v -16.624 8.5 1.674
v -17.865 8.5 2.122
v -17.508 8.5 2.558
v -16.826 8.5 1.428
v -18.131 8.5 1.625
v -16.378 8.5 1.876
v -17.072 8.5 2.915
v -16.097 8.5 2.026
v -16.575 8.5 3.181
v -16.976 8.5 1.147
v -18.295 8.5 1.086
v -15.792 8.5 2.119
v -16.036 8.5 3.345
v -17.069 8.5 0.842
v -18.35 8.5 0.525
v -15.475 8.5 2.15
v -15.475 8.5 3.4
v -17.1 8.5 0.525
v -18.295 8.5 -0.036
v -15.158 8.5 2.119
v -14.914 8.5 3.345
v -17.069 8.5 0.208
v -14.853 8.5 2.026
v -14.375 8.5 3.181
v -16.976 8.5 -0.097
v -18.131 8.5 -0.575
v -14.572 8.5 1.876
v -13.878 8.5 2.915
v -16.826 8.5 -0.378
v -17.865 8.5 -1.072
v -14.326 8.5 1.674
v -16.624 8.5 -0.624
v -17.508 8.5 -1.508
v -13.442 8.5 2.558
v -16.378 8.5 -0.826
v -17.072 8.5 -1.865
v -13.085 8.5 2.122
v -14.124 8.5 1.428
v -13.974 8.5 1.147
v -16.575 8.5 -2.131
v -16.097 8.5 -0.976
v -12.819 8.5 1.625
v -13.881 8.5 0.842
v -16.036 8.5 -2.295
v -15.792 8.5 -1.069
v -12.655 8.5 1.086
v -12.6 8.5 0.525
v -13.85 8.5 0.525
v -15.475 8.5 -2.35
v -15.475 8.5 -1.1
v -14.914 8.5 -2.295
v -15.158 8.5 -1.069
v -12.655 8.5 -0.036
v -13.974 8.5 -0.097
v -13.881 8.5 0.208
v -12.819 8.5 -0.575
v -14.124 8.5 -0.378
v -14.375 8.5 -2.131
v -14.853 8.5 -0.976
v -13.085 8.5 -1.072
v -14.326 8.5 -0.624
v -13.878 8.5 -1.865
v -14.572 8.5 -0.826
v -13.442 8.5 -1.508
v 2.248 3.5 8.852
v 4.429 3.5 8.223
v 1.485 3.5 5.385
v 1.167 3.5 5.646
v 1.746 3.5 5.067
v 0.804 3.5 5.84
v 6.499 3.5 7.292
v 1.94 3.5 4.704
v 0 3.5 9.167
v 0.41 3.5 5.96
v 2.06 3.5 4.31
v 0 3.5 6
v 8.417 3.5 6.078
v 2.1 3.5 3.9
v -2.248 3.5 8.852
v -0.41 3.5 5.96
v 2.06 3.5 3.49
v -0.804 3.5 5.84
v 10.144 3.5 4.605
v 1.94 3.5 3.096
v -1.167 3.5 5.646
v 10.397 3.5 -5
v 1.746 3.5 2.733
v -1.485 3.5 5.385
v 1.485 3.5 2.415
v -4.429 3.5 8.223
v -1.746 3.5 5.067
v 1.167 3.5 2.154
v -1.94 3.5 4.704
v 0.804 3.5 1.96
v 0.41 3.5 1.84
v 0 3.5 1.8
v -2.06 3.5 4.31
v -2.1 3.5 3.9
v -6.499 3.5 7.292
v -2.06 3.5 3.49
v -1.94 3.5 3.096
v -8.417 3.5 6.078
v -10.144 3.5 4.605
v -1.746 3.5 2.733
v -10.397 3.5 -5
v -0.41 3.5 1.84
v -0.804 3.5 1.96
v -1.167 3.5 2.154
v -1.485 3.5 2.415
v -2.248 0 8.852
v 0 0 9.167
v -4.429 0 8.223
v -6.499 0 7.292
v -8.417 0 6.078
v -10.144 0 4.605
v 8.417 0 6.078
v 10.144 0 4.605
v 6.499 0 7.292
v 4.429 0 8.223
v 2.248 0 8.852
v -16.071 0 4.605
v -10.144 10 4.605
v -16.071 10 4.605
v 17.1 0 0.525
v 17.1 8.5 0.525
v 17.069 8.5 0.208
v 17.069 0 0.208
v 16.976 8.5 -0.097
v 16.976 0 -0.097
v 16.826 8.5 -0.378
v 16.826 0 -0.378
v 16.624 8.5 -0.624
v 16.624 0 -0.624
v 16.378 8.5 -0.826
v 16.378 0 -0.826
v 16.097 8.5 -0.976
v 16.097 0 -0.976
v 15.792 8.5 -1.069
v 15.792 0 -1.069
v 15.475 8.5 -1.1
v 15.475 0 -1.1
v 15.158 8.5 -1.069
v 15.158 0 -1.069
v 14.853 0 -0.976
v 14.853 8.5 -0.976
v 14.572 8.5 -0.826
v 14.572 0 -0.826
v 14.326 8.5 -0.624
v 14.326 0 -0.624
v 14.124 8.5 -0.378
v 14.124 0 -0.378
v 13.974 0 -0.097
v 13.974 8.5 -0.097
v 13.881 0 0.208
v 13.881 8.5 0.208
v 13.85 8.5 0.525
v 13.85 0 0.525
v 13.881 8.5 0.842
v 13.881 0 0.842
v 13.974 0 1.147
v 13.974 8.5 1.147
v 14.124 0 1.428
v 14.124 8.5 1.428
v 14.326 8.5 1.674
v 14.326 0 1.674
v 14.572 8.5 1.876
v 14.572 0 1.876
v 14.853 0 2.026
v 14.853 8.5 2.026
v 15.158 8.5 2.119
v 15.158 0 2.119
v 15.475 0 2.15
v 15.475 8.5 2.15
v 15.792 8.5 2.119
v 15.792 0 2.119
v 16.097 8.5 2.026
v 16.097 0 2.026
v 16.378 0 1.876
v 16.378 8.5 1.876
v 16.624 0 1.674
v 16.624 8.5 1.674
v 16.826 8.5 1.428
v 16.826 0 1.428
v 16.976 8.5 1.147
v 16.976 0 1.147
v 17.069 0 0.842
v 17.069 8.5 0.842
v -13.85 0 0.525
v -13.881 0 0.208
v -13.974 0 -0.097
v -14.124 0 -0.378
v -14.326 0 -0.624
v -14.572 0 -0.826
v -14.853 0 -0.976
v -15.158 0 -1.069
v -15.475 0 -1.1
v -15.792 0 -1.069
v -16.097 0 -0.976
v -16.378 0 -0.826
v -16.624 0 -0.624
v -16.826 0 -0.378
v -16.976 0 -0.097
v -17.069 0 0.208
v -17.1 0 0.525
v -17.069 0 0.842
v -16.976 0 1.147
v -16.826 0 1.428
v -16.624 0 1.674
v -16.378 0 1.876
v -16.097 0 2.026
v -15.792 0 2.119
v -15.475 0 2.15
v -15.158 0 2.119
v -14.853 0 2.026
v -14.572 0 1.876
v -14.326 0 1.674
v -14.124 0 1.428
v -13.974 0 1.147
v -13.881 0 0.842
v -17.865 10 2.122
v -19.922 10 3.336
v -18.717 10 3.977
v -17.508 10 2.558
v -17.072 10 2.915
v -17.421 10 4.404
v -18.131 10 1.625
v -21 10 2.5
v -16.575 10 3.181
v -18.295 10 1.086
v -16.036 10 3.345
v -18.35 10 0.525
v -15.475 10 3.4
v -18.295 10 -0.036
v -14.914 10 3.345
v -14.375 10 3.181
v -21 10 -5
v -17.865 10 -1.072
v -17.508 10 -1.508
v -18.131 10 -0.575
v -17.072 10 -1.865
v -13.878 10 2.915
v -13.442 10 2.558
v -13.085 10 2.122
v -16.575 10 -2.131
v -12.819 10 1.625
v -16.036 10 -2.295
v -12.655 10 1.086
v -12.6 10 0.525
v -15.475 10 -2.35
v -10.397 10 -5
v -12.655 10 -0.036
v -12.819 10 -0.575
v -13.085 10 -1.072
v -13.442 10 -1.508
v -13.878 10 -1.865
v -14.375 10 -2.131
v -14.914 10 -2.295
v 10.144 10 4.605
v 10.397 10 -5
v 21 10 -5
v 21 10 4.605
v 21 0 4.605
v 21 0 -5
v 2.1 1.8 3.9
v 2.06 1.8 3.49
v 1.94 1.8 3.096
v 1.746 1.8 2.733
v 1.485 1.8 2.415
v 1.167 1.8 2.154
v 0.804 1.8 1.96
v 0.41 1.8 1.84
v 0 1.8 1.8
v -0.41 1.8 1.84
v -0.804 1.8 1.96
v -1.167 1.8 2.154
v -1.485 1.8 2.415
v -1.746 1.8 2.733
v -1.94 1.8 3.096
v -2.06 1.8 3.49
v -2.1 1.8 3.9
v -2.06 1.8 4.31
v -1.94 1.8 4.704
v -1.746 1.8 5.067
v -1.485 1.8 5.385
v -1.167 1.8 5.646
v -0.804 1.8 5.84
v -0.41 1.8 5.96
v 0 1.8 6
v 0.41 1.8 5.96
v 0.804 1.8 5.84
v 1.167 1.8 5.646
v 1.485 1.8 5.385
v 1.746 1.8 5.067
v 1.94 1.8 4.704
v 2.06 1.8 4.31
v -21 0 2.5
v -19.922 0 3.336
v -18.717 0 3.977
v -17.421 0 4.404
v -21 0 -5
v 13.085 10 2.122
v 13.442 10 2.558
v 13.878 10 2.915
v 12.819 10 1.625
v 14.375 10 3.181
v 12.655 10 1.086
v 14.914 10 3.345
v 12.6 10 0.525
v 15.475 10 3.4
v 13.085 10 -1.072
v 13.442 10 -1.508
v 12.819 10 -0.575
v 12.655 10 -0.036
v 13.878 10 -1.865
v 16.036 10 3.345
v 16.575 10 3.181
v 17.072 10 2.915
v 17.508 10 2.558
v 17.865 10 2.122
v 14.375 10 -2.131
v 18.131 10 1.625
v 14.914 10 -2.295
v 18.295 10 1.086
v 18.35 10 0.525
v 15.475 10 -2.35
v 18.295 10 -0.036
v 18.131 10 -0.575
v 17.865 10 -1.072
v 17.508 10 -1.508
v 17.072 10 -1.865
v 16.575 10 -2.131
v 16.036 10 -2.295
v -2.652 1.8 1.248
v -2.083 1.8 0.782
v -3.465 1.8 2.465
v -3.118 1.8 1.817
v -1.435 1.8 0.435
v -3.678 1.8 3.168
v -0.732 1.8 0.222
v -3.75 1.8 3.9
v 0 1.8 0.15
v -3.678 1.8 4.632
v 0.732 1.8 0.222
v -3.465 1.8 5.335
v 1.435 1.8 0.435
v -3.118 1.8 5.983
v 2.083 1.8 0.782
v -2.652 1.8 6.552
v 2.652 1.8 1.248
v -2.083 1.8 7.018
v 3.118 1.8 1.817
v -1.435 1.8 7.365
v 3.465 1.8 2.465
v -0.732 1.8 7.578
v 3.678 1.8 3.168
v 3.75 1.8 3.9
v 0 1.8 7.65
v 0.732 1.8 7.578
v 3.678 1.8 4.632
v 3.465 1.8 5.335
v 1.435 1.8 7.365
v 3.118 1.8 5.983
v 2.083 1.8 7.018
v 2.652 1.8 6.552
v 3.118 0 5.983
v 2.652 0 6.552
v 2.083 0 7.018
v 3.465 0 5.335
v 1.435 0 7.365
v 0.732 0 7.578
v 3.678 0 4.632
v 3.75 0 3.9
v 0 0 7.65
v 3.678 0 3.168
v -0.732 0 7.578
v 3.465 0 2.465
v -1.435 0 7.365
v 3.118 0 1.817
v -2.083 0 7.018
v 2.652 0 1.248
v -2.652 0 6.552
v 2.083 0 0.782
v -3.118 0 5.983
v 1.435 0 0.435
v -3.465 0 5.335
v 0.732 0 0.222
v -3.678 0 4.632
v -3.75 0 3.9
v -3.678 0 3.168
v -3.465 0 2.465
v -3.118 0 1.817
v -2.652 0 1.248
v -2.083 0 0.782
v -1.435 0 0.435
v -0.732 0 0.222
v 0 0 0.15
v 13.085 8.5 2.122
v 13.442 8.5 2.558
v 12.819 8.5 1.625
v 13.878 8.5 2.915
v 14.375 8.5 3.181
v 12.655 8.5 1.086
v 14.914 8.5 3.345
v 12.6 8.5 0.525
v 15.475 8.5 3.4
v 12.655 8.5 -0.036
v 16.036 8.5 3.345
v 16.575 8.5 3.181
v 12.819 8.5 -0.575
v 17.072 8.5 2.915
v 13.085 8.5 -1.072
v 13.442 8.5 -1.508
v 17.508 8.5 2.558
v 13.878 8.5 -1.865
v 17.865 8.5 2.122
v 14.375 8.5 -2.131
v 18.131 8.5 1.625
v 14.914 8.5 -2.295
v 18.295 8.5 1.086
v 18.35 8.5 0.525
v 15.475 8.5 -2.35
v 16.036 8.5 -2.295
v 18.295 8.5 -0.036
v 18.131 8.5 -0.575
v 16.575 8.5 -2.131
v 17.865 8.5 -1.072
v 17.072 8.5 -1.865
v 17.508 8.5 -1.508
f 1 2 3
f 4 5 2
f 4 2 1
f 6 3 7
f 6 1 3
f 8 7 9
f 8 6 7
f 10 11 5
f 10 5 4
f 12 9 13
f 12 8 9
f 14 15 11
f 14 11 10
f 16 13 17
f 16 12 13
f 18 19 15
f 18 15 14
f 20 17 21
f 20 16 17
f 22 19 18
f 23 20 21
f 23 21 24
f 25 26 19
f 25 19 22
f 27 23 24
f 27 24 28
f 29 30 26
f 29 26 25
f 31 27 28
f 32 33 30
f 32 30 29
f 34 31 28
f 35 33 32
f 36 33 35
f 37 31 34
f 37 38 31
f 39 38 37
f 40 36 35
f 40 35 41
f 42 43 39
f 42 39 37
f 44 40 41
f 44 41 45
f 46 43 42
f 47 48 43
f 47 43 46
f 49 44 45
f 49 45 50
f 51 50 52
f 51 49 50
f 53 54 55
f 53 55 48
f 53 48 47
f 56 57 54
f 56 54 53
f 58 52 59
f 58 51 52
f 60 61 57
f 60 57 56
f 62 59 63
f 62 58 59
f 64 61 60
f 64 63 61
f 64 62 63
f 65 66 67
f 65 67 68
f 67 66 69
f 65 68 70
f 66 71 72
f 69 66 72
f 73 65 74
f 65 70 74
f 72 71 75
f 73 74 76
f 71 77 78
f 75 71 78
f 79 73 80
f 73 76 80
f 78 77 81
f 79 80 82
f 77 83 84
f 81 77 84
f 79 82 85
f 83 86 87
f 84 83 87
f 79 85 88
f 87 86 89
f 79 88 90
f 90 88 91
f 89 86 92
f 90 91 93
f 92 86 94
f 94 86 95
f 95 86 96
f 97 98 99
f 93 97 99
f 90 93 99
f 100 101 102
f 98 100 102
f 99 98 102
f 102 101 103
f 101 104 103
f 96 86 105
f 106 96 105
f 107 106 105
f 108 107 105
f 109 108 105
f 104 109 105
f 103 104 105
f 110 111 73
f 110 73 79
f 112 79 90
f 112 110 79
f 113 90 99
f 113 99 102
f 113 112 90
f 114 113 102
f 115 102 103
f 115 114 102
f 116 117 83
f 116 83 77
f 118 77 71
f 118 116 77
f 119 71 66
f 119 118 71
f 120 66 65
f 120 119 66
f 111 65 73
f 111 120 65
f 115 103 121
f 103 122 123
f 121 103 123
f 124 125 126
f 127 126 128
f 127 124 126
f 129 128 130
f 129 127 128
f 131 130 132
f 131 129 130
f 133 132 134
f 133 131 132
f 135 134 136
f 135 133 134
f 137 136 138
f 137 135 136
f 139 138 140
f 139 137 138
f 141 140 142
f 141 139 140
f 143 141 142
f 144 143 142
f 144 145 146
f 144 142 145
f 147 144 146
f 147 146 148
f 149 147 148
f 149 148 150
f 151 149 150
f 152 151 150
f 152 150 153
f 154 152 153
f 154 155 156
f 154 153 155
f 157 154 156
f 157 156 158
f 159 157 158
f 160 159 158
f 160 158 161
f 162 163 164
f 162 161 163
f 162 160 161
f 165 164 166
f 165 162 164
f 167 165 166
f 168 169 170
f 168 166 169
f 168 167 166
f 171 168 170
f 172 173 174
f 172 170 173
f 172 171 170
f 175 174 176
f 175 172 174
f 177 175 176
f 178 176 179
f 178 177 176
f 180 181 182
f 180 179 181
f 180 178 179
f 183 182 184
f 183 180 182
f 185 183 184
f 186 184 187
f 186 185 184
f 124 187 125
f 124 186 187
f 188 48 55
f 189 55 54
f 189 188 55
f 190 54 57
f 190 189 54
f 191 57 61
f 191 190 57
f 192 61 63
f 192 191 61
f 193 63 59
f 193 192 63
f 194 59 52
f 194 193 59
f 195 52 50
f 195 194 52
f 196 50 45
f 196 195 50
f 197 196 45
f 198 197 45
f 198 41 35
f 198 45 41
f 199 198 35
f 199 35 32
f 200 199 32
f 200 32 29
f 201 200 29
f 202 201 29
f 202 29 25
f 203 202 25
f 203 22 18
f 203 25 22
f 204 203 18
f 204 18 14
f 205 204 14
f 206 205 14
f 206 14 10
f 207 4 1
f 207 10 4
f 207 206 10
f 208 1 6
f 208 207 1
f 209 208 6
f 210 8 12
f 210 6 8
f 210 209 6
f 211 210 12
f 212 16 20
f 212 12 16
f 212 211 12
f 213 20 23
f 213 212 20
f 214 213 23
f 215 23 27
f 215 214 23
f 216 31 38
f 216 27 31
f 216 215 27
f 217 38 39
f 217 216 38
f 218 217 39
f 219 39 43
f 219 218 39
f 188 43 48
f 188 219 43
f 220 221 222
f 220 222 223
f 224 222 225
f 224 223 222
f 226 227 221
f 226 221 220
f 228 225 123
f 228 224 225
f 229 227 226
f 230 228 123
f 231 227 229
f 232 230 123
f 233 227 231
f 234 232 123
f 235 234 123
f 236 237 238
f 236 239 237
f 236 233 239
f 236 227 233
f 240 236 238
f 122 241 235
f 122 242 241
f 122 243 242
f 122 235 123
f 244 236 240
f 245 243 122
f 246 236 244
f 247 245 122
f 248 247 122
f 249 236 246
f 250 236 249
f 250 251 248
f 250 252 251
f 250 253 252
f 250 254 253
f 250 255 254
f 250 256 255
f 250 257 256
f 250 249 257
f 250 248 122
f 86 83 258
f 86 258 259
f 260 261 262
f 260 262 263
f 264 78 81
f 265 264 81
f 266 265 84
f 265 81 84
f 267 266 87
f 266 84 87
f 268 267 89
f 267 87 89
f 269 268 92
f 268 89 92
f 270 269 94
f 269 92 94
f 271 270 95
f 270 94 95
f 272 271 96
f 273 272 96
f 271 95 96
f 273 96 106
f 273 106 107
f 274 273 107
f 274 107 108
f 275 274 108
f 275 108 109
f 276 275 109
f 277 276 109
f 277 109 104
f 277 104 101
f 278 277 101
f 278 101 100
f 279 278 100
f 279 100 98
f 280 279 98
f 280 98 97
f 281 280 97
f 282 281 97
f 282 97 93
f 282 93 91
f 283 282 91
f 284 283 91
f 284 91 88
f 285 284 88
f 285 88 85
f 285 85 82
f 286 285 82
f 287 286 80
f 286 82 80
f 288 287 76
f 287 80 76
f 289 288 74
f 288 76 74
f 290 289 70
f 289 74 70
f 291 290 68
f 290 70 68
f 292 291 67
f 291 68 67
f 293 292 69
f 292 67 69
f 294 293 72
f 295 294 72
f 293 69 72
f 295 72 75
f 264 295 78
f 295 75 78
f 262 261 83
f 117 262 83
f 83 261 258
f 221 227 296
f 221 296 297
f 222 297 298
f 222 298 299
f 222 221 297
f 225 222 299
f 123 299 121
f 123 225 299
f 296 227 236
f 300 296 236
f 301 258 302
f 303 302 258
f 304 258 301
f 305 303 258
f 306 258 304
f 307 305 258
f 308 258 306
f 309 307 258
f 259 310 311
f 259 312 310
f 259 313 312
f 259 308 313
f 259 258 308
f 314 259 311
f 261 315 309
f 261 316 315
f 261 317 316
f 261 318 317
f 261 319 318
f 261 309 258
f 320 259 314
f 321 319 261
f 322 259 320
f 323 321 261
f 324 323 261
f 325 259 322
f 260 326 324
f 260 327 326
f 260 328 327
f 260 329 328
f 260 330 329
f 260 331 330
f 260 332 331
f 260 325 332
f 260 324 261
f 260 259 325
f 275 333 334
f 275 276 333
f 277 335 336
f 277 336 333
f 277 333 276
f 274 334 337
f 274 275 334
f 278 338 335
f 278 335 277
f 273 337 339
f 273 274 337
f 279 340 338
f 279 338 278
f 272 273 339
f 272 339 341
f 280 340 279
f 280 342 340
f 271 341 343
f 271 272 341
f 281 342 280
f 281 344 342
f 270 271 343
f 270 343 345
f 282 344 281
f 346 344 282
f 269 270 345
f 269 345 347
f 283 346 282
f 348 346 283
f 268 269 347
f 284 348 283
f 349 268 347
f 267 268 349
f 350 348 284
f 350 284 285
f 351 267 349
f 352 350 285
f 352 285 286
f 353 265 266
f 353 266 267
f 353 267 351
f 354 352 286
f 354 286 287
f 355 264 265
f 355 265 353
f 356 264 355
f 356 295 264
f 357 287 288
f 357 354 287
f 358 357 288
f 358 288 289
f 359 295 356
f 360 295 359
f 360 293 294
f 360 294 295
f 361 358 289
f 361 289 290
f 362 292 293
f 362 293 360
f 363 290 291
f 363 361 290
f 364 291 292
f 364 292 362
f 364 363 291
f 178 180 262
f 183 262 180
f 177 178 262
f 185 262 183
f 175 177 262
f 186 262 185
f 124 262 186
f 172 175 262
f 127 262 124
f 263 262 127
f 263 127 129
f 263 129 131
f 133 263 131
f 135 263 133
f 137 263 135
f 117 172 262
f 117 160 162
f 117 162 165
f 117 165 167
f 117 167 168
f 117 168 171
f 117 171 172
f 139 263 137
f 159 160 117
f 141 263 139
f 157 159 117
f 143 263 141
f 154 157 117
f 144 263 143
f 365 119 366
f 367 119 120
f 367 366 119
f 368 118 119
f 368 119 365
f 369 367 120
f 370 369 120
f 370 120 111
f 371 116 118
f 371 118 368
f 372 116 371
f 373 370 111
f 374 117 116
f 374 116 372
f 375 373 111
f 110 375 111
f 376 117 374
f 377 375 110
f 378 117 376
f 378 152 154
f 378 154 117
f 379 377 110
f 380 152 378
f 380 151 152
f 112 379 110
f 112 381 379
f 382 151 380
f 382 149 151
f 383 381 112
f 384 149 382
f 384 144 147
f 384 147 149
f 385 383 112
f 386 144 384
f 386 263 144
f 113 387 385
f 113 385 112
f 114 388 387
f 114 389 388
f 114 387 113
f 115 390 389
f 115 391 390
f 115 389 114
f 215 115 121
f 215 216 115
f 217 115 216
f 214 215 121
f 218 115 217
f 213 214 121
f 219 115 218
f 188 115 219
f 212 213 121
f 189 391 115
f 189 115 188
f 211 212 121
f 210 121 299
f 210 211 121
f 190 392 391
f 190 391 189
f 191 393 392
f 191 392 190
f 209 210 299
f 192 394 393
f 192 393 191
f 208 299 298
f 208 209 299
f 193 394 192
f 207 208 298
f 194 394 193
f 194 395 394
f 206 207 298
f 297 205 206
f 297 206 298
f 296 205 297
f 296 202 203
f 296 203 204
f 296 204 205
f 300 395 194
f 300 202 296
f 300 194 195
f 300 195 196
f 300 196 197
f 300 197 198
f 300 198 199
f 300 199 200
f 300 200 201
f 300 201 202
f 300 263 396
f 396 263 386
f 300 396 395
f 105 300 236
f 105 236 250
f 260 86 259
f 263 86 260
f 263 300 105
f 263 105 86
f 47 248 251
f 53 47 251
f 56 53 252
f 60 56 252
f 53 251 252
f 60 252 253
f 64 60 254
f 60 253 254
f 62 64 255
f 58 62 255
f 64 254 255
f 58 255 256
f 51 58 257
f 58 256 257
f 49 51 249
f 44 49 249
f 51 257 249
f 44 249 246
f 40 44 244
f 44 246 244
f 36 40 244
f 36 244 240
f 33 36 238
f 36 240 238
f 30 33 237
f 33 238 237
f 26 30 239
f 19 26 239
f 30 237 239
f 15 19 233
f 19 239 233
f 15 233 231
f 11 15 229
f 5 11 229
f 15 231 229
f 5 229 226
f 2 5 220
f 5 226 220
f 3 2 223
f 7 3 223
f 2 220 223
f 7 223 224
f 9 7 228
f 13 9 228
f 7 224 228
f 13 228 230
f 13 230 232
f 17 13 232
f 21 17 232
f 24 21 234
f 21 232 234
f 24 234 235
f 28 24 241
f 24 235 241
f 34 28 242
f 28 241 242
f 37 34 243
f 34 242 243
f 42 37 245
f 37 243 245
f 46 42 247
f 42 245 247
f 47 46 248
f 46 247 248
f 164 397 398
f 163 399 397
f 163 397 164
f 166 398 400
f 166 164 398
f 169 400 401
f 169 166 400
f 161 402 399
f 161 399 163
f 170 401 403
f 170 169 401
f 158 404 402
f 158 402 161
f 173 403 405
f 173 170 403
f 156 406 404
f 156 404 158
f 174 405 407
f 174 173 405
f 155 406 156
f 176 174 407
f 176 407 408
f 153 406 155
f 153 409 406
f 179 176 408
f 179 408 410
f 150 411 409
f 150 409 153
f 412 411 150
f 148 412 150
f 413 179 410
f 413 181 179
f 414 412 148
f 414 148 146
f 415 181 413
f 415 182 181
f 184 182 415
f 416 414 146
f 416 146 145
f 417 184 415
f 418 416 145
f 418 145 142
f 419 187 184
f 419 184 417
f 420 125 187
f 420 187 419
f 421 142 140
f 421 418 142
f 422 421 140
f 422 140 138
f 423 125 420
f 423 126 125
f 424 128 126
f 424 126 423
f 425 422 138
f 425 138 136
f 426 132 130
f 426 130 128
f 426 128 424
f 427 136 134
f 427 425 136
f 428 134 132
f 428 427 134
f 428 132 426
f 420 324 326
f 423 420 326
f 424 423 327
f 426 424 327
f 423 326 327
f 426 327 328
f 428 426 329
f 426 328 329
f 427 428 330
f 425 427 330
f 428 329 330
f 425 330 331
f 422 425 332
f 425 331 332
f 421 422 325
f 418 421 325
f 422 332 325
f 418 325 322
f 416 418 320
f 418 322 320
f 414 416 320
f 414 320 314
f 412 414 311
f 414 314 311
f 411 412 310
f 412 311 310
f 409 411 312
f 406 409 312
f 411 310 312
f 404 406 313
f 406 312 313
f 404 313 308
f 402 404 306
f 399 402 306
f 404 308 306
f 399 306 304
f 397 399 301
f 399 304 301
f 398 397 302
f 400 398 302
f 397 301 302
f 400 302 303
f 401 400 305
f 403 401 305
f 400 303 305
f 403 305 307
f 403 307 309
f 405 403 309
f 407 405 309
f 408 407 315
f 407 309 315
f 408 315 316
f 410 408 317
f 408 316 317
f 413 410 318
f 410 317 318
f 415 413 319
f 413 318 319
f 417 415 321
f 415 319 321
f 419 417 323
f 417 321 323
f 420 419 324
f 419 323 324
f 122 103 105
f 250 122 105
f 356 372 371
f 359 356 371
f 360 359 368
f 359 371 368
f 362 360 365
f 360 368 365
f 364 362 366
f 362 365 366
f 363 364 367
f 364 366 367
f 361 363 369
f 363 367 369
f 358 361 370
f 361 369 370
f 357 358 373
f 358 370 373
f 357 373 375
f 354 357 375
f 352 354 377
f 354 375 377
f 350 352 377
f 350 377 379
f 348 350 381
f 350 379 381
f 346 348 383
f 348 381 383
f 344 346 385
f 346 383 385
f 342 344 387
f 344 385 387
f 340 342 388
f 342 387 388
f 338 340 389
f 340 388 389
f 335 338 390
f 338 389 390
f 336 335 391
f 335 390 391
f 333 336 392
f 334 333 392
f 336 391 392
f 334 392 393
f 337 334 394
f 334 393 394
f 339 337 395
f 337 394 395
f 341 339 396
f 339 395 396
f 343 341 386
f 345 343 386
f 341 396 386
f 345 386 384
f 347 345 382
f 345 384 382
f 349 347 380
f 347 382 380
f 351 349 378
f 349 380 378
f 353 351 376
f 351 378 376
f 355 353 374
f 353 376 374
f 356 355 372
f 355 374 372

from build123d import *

# Parameters (mm, degrees)
SKETCH1_W           = 42
SKETCH1_H           = 10
SKETCH1_R           = 1.625
BOSS_EXTRUDE1_DEPTH = 10
SKETCH2_R           = 10.152178523
CUT_EXTRUDE2_DEPTH  = 6.5
CUT_EXTRUDE3_DEPTH  = 10
SKETCH4_R           = 2.875
CUT_EXTRUDE4_DEPTH  = 1.5
CUT_EXTRUDE5_DEPTH  = 8
BOSS_EXTRUDE6_DEPTH = 3.5
SKETCH10_R          = 2.1
CUT_EXTRUDE6_DEPTH  = 4.5
CUT_EXTRUDE8_DEPTH  = 10
SKETCH13_R          = 3.75
CUT_EXTRUDE9_DEPTH  = 1.8


with BuildPart() as part:
    # Sketch1 → Boss-Extrude1 (new body)
    with BuildSketch(Plane(origin=(0, 0, 0), x_dir=(1, 0, 0), z_dir=(0, 1, 0))):
        Rectangle(SKETCH1_W, SKETCH1_H)
        with Locations((-15.475, -0.525)):
            Circle(SKETCH1_R, mode=Mode.SUBTRACT)
        with Locations((15.475, -0.525)):
            Circle(SKETCH1_R, mode=Mode.SUBTRACT)
    extrude(amount=BOSS_EXTRUDE1_DEPTH)

    # Sketch2 → Cut-Extrude2 (cut)
    with BuildSketch(Plane(origin=(0, 10, 0), x_dir=(1, 0, 0), z_dir=(0, 1, 0))):
        with Locations((0, -5)):
            Circle(SKETCH2_R)
    extrude(amount=-CUT_EXTRUDE2_DEPTH, mode=Mode.SUBTRACT)

    # Sketch3 → Cut-Extrude3 (cut, symmetric)
    with BuildSketch(Plane(origin=(0, 3.5, 0), x_dir=(1, 0, 0), z_dir=(0, 1, 0))):
        Polygon((-21, -5), (21, -5), (21, -4.605153404), (9.605793631, -4.605153404), (9.605793631, -4.916952006), (-9.605793631, -4.916952006), (-9.605793631, -4.605153404), (-21, -4.605153404), (-21, -4.916952006), align=None)
    extrude(amount=CUT_EXTRUDE3_DEPTH, both=True, mode=Mode.SUBTRACT)

    # Sketch4 → Cut-Extrude4 (cut)
    with BuildSketch(Plane(origin=(0, 10, 0), x_dir=(1, 0, 0), z_dir=(0, 1, 0))):
        with Locations((-15.475, -0.525)):
            Circle(SKETCH4_R)
        with Locations((15.475, -0.525)):
            Circle(SKETCH4_R)
    extrude(amount=-CUT_EXTRUDE4_DEPTH, mode=Mode.SUBTRACT)

    # Sketch6 → Cut-Extrude5 (cut)
    with BuildSketch(Plane(origin=(0, 3.5, 0), x_dir=(1, 0, 0), z_dir=(0, 1, 0))):
        with BuildLine():
            Line((-10.144497274, -4.605153404), (-10.396714549, 5))
            Line((-10.396714549, 5), (-1.751207804, 5))
            ThreePointArc((-1.751207804, 5), (-7.644716659, 1.6801973), (-10.144497274, -4.605153404))
        make_face()
        with BuildLine():
            Line((10.144497274, -4.605153404), (10.396714549, 5))
            Line((10.396714549, 5), (1.751207804, 5))
            ThreePointArc((1.751207804, 5), (7.644716659, 1.6801973), (10.144497274, -4.605153404))
        make_face()
    extrude(amount=CUT_EXTRUDE5_DEPTH, mode=Mode.SUBTRACT)

    # Sketch9 → Boss-Extrude6 (add)
    with BuildSketch(Plane(origin=(0, 0, 0), x_dir=(1, 0, 0), z_dir=(0, 1, 0))):
        with BuildLine():
            Line((-10.144497274, -4.605153404), (-9.605793631, -4.605153404))
            Line((-9.605793631, -4.605153404), (-9.605793631, -4.916952006))
            Line((-9.605793631, -4.916952006), (9.605793631, -4.916952006))
            Line((9.605793631, -4.916952006), (9.605793631, -4.605153404))
            Line((9.605793631, -4.605153404), (10.144497274, -4.605153404))
            ThreePointArc((10.144497274, -4.605153404), (5.480668968, -7.794295111), (0, -9.166952006))
            ThreePointArc((0, -9.166952006), (-5.480668968, -7.794295111), (-10.144497274, -4.605153404))
        make_face()
    extrude(amount=BOSS_EXTRUDE6_DEPTH)

    # Sketch10 → Cut-Extrude6 (cut)
    with BuildSketch(Plane(origin=(0, 3.5, 0), x_dir=(1, 0, 0), z_dir=(0, 1, 0))):
        with Locations((0, -3.9)):
            Circle(SKETCH10_R)
    extrude(amount=-CUT_EXTRUDE6_DEPTH, mode=Mode.SUBTRACT)

    # Sketch12 → Cut-Extrude8 (cut)
    with BuildSketch(Plane(origin=(0, 10, 0), x_dir=(1, 0, 0), z_dir=(0, 1, 0))):
        with BuildLine():
            Line((-21, -4.605153404), (-21, -2.499927291))
            ThreePointArc((-21, -2.499927291), (-18.716787092, -3.977228829), (-16.070810572, -4.605153404))
            Line((-16.070810572, -4.605153404), (-21, -4.605153404))
        make_face()
    extrude(amount=-CUT_EXTRUDE8_DEPTH, mode=Mode.SUBTRACT)

    # Sketch13 → Cut-Extrude9 (cut)
    with BuildSketch(Plane.XZ):
        with Locations((0, 3.9)):
            Circle(SKETCH13_R)
    extrude(amount=-CUT_EXTRUDE9_DEPTH, mode=Mode.SUBTRACT)


solid = part.part
